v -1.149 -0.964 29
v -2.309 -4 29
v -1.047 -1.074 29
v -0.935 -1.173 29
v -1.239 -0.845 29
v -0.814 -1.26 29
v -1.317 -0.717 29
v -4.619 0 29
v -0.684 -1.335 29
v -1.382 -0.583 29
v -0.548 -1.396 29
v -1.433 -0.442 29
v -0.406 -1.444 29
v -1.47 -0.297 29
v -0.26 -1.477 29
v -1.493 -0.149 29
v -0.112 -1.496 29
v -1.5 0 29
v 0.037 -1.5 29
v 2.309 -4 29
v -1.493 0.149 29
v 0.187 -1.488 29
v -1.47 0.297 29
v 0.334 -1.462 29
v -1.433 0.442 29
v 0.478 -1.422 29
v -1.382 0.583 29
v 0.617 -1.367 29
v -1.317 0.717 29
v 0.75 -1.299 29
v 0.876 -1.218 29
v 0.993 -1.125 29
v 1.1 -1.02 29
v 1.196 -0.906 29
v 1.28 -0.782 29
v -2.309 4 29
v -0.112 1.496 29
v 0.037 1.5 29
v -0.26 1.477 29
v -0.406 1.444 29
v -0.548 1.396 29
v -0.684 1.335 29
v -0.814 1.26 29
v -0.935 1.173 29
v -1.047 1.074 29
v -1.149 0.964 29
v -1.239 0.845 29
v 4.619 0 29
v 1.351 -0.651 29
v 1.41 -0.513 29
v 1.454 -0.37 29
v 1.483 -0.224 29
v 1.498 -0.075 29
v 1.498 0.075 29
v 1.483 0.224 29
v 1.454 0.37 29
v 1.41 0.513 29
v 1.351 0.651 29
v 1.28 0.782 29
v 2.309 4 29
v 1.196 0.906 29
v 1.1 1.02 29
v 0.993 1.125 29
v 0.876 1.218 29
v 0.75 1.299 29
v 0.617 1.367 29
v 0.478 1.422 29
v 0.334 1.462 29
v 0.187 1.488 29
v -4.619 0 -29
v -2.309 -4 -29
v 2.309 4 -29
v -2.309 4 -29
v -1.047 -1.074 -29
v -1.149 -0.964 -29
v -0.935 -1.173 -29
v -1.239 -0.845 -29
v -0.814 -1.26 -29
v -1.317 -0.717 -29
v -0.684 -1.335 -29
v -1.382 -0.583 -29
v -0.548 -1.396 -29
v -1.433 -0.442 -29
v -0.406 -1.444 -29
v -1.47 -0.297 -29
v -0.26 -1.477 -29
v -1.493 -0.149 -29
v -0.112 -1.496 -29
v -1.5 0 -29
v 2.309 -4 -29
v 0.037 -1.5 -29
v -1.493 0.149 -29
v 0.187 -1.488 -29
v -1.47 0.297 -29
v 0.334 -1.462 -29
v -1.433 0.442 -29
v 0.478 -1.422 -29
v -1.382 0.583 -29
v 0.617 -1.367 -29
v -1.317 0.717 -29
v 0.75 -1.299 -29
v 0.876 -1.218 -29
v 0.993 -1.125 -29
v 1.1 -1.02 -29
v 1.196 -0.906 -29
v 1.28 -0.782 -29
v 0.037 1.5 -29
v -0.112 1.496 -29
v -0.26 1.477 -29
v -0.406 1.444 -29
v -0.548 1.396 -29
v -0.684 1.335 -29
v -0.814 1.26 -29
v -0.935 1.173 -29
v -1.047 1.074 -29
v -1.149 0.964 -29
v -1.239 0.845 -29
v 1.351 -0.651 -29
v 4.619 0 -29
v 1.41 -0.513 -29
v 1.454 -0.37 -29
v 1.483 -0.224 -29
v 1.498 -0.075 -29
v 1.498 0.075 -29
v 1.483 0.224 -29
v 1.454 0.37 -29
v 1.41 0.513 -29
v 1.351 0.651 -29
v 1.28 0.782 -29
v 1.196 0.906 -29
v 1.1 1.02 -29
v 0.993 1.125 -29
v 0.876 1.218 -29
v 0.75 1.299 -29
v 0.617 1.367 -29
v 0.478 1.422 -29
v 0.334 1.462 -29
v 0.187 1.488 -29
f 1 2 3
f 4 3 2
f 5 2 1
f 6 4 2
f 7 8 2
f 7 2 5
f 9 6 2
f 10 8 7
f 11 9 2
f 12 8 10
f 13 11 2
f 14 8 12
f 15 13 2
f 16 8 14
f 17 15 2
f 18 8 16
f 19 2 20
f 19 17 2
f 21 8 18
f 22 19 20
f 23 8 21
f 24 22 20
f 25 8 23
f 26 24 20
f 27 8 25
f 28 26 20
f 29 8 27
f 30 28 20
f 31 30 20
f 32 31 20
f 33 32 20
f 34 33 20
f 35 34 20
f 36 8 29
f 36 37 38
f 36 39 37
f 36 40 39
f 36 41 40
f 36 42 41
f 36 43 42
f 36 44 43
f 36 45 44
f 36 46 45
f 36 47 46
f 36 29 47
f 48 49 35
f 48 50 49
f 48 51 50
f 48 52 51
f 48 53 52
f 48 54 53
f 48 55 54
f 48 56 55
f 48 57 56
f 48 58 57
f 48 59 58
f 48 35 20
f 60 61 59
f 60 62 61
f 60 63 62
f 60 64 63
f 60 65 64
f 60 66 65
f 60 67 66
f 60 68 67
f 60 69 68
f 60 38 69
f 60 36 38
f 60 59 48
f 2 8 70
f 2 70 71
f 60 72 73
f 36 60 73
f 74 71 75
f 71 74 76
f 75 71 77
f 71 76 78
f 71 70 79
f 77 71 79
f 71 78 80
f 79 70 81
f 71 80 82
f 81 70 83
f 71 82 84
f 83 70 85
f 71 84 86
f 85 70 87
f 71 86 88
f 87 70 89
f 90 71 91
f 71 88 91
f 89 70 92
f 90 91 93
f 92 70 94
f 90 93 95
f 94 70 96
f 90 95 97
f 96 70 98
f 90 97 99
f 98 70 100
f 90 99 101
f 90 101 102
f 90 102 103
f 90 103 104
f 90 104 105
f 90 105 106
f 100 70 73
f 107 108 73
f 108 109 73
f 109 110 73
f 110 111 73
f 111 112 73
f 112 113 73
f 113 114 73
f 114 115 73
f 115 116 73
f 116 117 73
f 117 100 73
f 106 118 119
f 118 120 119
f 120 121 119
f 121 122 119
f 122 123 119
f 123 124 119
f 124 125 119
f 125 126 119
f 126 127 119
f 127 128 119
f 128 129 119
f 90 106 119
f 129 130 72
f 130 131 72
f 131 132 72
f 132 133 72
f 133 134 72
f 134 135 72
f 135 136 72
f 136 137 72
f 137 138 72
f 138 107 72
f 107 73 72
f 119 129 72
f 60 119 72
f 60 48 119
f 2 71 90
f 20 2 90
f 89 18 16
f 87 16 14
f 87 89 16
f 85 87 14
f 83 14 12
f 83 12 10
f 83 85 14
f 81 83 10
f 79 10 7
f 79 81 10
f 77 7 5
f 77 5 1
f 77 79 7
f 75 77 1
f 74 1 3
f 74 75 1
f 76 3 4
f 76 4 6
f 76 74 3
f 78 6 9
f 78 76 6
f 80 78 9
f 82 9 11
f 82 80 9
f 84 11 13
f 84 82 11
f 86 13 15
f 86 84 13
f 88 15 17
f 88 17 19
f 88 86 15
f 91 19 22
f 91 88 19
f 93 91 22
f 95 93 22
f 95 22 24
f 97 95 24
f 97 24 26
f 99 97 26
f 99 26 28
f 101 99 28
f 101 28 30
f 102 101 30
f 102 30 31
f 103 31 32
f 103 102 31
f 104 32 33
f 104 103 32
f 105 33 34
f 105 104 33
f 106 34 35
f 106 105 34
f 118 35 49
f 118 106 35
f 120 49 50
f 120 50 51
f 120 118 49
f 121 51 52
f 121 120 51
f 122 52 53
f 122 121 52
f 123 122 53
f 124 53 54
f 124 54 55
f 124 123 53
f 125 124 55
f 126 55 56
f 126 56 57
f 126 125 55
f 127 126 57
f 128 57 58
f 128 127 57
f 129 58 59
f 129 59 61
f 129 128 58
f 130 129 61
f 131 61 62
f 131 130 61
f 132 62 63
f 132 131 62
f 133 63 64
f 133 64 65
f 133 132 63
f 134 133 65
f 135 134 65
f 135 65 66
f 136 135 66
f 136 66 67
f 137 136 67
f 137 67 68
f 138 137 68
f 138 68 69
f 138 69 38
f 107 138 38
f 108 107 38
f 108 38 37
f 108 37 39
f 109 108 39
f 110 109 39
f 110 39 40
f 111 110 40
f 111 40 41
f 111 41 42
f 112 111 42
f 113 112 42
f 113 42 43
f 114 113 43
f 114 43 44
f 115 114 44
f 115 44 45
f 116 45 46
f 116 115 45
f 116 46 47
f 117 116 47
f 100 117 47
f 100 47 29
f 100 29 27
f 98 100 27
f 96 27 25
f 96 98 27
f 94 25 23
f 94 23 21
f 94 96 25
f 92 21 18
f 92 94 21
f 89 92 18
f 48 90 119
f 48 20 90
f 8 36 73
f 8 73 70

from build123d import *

# Parameters (mm, degrees)
CROQUIS1_R              = 1.5
SALIENTE_EXTRUIR1_DEPTH = 29


with BuildPart() as part:
    # Croquis1 → Saliente-Extruir1 (new, symmetric)
    with BuildSketch(Plane.XY):
        Polygon((4.618802154, 0), (2.309401077, 4), (-2.309401077, 4), (-4.618802154, 0), (-2.309401077, -4), (2.309401077, -4), align=None)
        with Locations(Location((0, 0, 0), (0, 0, 180))):
            Circle(CROQUIS1_R, mode=Mode.SUBTRACT)
    extrude(amount=SALIENTE_EXTRUIR1_DEPTH, both=True)


solid = part.part
